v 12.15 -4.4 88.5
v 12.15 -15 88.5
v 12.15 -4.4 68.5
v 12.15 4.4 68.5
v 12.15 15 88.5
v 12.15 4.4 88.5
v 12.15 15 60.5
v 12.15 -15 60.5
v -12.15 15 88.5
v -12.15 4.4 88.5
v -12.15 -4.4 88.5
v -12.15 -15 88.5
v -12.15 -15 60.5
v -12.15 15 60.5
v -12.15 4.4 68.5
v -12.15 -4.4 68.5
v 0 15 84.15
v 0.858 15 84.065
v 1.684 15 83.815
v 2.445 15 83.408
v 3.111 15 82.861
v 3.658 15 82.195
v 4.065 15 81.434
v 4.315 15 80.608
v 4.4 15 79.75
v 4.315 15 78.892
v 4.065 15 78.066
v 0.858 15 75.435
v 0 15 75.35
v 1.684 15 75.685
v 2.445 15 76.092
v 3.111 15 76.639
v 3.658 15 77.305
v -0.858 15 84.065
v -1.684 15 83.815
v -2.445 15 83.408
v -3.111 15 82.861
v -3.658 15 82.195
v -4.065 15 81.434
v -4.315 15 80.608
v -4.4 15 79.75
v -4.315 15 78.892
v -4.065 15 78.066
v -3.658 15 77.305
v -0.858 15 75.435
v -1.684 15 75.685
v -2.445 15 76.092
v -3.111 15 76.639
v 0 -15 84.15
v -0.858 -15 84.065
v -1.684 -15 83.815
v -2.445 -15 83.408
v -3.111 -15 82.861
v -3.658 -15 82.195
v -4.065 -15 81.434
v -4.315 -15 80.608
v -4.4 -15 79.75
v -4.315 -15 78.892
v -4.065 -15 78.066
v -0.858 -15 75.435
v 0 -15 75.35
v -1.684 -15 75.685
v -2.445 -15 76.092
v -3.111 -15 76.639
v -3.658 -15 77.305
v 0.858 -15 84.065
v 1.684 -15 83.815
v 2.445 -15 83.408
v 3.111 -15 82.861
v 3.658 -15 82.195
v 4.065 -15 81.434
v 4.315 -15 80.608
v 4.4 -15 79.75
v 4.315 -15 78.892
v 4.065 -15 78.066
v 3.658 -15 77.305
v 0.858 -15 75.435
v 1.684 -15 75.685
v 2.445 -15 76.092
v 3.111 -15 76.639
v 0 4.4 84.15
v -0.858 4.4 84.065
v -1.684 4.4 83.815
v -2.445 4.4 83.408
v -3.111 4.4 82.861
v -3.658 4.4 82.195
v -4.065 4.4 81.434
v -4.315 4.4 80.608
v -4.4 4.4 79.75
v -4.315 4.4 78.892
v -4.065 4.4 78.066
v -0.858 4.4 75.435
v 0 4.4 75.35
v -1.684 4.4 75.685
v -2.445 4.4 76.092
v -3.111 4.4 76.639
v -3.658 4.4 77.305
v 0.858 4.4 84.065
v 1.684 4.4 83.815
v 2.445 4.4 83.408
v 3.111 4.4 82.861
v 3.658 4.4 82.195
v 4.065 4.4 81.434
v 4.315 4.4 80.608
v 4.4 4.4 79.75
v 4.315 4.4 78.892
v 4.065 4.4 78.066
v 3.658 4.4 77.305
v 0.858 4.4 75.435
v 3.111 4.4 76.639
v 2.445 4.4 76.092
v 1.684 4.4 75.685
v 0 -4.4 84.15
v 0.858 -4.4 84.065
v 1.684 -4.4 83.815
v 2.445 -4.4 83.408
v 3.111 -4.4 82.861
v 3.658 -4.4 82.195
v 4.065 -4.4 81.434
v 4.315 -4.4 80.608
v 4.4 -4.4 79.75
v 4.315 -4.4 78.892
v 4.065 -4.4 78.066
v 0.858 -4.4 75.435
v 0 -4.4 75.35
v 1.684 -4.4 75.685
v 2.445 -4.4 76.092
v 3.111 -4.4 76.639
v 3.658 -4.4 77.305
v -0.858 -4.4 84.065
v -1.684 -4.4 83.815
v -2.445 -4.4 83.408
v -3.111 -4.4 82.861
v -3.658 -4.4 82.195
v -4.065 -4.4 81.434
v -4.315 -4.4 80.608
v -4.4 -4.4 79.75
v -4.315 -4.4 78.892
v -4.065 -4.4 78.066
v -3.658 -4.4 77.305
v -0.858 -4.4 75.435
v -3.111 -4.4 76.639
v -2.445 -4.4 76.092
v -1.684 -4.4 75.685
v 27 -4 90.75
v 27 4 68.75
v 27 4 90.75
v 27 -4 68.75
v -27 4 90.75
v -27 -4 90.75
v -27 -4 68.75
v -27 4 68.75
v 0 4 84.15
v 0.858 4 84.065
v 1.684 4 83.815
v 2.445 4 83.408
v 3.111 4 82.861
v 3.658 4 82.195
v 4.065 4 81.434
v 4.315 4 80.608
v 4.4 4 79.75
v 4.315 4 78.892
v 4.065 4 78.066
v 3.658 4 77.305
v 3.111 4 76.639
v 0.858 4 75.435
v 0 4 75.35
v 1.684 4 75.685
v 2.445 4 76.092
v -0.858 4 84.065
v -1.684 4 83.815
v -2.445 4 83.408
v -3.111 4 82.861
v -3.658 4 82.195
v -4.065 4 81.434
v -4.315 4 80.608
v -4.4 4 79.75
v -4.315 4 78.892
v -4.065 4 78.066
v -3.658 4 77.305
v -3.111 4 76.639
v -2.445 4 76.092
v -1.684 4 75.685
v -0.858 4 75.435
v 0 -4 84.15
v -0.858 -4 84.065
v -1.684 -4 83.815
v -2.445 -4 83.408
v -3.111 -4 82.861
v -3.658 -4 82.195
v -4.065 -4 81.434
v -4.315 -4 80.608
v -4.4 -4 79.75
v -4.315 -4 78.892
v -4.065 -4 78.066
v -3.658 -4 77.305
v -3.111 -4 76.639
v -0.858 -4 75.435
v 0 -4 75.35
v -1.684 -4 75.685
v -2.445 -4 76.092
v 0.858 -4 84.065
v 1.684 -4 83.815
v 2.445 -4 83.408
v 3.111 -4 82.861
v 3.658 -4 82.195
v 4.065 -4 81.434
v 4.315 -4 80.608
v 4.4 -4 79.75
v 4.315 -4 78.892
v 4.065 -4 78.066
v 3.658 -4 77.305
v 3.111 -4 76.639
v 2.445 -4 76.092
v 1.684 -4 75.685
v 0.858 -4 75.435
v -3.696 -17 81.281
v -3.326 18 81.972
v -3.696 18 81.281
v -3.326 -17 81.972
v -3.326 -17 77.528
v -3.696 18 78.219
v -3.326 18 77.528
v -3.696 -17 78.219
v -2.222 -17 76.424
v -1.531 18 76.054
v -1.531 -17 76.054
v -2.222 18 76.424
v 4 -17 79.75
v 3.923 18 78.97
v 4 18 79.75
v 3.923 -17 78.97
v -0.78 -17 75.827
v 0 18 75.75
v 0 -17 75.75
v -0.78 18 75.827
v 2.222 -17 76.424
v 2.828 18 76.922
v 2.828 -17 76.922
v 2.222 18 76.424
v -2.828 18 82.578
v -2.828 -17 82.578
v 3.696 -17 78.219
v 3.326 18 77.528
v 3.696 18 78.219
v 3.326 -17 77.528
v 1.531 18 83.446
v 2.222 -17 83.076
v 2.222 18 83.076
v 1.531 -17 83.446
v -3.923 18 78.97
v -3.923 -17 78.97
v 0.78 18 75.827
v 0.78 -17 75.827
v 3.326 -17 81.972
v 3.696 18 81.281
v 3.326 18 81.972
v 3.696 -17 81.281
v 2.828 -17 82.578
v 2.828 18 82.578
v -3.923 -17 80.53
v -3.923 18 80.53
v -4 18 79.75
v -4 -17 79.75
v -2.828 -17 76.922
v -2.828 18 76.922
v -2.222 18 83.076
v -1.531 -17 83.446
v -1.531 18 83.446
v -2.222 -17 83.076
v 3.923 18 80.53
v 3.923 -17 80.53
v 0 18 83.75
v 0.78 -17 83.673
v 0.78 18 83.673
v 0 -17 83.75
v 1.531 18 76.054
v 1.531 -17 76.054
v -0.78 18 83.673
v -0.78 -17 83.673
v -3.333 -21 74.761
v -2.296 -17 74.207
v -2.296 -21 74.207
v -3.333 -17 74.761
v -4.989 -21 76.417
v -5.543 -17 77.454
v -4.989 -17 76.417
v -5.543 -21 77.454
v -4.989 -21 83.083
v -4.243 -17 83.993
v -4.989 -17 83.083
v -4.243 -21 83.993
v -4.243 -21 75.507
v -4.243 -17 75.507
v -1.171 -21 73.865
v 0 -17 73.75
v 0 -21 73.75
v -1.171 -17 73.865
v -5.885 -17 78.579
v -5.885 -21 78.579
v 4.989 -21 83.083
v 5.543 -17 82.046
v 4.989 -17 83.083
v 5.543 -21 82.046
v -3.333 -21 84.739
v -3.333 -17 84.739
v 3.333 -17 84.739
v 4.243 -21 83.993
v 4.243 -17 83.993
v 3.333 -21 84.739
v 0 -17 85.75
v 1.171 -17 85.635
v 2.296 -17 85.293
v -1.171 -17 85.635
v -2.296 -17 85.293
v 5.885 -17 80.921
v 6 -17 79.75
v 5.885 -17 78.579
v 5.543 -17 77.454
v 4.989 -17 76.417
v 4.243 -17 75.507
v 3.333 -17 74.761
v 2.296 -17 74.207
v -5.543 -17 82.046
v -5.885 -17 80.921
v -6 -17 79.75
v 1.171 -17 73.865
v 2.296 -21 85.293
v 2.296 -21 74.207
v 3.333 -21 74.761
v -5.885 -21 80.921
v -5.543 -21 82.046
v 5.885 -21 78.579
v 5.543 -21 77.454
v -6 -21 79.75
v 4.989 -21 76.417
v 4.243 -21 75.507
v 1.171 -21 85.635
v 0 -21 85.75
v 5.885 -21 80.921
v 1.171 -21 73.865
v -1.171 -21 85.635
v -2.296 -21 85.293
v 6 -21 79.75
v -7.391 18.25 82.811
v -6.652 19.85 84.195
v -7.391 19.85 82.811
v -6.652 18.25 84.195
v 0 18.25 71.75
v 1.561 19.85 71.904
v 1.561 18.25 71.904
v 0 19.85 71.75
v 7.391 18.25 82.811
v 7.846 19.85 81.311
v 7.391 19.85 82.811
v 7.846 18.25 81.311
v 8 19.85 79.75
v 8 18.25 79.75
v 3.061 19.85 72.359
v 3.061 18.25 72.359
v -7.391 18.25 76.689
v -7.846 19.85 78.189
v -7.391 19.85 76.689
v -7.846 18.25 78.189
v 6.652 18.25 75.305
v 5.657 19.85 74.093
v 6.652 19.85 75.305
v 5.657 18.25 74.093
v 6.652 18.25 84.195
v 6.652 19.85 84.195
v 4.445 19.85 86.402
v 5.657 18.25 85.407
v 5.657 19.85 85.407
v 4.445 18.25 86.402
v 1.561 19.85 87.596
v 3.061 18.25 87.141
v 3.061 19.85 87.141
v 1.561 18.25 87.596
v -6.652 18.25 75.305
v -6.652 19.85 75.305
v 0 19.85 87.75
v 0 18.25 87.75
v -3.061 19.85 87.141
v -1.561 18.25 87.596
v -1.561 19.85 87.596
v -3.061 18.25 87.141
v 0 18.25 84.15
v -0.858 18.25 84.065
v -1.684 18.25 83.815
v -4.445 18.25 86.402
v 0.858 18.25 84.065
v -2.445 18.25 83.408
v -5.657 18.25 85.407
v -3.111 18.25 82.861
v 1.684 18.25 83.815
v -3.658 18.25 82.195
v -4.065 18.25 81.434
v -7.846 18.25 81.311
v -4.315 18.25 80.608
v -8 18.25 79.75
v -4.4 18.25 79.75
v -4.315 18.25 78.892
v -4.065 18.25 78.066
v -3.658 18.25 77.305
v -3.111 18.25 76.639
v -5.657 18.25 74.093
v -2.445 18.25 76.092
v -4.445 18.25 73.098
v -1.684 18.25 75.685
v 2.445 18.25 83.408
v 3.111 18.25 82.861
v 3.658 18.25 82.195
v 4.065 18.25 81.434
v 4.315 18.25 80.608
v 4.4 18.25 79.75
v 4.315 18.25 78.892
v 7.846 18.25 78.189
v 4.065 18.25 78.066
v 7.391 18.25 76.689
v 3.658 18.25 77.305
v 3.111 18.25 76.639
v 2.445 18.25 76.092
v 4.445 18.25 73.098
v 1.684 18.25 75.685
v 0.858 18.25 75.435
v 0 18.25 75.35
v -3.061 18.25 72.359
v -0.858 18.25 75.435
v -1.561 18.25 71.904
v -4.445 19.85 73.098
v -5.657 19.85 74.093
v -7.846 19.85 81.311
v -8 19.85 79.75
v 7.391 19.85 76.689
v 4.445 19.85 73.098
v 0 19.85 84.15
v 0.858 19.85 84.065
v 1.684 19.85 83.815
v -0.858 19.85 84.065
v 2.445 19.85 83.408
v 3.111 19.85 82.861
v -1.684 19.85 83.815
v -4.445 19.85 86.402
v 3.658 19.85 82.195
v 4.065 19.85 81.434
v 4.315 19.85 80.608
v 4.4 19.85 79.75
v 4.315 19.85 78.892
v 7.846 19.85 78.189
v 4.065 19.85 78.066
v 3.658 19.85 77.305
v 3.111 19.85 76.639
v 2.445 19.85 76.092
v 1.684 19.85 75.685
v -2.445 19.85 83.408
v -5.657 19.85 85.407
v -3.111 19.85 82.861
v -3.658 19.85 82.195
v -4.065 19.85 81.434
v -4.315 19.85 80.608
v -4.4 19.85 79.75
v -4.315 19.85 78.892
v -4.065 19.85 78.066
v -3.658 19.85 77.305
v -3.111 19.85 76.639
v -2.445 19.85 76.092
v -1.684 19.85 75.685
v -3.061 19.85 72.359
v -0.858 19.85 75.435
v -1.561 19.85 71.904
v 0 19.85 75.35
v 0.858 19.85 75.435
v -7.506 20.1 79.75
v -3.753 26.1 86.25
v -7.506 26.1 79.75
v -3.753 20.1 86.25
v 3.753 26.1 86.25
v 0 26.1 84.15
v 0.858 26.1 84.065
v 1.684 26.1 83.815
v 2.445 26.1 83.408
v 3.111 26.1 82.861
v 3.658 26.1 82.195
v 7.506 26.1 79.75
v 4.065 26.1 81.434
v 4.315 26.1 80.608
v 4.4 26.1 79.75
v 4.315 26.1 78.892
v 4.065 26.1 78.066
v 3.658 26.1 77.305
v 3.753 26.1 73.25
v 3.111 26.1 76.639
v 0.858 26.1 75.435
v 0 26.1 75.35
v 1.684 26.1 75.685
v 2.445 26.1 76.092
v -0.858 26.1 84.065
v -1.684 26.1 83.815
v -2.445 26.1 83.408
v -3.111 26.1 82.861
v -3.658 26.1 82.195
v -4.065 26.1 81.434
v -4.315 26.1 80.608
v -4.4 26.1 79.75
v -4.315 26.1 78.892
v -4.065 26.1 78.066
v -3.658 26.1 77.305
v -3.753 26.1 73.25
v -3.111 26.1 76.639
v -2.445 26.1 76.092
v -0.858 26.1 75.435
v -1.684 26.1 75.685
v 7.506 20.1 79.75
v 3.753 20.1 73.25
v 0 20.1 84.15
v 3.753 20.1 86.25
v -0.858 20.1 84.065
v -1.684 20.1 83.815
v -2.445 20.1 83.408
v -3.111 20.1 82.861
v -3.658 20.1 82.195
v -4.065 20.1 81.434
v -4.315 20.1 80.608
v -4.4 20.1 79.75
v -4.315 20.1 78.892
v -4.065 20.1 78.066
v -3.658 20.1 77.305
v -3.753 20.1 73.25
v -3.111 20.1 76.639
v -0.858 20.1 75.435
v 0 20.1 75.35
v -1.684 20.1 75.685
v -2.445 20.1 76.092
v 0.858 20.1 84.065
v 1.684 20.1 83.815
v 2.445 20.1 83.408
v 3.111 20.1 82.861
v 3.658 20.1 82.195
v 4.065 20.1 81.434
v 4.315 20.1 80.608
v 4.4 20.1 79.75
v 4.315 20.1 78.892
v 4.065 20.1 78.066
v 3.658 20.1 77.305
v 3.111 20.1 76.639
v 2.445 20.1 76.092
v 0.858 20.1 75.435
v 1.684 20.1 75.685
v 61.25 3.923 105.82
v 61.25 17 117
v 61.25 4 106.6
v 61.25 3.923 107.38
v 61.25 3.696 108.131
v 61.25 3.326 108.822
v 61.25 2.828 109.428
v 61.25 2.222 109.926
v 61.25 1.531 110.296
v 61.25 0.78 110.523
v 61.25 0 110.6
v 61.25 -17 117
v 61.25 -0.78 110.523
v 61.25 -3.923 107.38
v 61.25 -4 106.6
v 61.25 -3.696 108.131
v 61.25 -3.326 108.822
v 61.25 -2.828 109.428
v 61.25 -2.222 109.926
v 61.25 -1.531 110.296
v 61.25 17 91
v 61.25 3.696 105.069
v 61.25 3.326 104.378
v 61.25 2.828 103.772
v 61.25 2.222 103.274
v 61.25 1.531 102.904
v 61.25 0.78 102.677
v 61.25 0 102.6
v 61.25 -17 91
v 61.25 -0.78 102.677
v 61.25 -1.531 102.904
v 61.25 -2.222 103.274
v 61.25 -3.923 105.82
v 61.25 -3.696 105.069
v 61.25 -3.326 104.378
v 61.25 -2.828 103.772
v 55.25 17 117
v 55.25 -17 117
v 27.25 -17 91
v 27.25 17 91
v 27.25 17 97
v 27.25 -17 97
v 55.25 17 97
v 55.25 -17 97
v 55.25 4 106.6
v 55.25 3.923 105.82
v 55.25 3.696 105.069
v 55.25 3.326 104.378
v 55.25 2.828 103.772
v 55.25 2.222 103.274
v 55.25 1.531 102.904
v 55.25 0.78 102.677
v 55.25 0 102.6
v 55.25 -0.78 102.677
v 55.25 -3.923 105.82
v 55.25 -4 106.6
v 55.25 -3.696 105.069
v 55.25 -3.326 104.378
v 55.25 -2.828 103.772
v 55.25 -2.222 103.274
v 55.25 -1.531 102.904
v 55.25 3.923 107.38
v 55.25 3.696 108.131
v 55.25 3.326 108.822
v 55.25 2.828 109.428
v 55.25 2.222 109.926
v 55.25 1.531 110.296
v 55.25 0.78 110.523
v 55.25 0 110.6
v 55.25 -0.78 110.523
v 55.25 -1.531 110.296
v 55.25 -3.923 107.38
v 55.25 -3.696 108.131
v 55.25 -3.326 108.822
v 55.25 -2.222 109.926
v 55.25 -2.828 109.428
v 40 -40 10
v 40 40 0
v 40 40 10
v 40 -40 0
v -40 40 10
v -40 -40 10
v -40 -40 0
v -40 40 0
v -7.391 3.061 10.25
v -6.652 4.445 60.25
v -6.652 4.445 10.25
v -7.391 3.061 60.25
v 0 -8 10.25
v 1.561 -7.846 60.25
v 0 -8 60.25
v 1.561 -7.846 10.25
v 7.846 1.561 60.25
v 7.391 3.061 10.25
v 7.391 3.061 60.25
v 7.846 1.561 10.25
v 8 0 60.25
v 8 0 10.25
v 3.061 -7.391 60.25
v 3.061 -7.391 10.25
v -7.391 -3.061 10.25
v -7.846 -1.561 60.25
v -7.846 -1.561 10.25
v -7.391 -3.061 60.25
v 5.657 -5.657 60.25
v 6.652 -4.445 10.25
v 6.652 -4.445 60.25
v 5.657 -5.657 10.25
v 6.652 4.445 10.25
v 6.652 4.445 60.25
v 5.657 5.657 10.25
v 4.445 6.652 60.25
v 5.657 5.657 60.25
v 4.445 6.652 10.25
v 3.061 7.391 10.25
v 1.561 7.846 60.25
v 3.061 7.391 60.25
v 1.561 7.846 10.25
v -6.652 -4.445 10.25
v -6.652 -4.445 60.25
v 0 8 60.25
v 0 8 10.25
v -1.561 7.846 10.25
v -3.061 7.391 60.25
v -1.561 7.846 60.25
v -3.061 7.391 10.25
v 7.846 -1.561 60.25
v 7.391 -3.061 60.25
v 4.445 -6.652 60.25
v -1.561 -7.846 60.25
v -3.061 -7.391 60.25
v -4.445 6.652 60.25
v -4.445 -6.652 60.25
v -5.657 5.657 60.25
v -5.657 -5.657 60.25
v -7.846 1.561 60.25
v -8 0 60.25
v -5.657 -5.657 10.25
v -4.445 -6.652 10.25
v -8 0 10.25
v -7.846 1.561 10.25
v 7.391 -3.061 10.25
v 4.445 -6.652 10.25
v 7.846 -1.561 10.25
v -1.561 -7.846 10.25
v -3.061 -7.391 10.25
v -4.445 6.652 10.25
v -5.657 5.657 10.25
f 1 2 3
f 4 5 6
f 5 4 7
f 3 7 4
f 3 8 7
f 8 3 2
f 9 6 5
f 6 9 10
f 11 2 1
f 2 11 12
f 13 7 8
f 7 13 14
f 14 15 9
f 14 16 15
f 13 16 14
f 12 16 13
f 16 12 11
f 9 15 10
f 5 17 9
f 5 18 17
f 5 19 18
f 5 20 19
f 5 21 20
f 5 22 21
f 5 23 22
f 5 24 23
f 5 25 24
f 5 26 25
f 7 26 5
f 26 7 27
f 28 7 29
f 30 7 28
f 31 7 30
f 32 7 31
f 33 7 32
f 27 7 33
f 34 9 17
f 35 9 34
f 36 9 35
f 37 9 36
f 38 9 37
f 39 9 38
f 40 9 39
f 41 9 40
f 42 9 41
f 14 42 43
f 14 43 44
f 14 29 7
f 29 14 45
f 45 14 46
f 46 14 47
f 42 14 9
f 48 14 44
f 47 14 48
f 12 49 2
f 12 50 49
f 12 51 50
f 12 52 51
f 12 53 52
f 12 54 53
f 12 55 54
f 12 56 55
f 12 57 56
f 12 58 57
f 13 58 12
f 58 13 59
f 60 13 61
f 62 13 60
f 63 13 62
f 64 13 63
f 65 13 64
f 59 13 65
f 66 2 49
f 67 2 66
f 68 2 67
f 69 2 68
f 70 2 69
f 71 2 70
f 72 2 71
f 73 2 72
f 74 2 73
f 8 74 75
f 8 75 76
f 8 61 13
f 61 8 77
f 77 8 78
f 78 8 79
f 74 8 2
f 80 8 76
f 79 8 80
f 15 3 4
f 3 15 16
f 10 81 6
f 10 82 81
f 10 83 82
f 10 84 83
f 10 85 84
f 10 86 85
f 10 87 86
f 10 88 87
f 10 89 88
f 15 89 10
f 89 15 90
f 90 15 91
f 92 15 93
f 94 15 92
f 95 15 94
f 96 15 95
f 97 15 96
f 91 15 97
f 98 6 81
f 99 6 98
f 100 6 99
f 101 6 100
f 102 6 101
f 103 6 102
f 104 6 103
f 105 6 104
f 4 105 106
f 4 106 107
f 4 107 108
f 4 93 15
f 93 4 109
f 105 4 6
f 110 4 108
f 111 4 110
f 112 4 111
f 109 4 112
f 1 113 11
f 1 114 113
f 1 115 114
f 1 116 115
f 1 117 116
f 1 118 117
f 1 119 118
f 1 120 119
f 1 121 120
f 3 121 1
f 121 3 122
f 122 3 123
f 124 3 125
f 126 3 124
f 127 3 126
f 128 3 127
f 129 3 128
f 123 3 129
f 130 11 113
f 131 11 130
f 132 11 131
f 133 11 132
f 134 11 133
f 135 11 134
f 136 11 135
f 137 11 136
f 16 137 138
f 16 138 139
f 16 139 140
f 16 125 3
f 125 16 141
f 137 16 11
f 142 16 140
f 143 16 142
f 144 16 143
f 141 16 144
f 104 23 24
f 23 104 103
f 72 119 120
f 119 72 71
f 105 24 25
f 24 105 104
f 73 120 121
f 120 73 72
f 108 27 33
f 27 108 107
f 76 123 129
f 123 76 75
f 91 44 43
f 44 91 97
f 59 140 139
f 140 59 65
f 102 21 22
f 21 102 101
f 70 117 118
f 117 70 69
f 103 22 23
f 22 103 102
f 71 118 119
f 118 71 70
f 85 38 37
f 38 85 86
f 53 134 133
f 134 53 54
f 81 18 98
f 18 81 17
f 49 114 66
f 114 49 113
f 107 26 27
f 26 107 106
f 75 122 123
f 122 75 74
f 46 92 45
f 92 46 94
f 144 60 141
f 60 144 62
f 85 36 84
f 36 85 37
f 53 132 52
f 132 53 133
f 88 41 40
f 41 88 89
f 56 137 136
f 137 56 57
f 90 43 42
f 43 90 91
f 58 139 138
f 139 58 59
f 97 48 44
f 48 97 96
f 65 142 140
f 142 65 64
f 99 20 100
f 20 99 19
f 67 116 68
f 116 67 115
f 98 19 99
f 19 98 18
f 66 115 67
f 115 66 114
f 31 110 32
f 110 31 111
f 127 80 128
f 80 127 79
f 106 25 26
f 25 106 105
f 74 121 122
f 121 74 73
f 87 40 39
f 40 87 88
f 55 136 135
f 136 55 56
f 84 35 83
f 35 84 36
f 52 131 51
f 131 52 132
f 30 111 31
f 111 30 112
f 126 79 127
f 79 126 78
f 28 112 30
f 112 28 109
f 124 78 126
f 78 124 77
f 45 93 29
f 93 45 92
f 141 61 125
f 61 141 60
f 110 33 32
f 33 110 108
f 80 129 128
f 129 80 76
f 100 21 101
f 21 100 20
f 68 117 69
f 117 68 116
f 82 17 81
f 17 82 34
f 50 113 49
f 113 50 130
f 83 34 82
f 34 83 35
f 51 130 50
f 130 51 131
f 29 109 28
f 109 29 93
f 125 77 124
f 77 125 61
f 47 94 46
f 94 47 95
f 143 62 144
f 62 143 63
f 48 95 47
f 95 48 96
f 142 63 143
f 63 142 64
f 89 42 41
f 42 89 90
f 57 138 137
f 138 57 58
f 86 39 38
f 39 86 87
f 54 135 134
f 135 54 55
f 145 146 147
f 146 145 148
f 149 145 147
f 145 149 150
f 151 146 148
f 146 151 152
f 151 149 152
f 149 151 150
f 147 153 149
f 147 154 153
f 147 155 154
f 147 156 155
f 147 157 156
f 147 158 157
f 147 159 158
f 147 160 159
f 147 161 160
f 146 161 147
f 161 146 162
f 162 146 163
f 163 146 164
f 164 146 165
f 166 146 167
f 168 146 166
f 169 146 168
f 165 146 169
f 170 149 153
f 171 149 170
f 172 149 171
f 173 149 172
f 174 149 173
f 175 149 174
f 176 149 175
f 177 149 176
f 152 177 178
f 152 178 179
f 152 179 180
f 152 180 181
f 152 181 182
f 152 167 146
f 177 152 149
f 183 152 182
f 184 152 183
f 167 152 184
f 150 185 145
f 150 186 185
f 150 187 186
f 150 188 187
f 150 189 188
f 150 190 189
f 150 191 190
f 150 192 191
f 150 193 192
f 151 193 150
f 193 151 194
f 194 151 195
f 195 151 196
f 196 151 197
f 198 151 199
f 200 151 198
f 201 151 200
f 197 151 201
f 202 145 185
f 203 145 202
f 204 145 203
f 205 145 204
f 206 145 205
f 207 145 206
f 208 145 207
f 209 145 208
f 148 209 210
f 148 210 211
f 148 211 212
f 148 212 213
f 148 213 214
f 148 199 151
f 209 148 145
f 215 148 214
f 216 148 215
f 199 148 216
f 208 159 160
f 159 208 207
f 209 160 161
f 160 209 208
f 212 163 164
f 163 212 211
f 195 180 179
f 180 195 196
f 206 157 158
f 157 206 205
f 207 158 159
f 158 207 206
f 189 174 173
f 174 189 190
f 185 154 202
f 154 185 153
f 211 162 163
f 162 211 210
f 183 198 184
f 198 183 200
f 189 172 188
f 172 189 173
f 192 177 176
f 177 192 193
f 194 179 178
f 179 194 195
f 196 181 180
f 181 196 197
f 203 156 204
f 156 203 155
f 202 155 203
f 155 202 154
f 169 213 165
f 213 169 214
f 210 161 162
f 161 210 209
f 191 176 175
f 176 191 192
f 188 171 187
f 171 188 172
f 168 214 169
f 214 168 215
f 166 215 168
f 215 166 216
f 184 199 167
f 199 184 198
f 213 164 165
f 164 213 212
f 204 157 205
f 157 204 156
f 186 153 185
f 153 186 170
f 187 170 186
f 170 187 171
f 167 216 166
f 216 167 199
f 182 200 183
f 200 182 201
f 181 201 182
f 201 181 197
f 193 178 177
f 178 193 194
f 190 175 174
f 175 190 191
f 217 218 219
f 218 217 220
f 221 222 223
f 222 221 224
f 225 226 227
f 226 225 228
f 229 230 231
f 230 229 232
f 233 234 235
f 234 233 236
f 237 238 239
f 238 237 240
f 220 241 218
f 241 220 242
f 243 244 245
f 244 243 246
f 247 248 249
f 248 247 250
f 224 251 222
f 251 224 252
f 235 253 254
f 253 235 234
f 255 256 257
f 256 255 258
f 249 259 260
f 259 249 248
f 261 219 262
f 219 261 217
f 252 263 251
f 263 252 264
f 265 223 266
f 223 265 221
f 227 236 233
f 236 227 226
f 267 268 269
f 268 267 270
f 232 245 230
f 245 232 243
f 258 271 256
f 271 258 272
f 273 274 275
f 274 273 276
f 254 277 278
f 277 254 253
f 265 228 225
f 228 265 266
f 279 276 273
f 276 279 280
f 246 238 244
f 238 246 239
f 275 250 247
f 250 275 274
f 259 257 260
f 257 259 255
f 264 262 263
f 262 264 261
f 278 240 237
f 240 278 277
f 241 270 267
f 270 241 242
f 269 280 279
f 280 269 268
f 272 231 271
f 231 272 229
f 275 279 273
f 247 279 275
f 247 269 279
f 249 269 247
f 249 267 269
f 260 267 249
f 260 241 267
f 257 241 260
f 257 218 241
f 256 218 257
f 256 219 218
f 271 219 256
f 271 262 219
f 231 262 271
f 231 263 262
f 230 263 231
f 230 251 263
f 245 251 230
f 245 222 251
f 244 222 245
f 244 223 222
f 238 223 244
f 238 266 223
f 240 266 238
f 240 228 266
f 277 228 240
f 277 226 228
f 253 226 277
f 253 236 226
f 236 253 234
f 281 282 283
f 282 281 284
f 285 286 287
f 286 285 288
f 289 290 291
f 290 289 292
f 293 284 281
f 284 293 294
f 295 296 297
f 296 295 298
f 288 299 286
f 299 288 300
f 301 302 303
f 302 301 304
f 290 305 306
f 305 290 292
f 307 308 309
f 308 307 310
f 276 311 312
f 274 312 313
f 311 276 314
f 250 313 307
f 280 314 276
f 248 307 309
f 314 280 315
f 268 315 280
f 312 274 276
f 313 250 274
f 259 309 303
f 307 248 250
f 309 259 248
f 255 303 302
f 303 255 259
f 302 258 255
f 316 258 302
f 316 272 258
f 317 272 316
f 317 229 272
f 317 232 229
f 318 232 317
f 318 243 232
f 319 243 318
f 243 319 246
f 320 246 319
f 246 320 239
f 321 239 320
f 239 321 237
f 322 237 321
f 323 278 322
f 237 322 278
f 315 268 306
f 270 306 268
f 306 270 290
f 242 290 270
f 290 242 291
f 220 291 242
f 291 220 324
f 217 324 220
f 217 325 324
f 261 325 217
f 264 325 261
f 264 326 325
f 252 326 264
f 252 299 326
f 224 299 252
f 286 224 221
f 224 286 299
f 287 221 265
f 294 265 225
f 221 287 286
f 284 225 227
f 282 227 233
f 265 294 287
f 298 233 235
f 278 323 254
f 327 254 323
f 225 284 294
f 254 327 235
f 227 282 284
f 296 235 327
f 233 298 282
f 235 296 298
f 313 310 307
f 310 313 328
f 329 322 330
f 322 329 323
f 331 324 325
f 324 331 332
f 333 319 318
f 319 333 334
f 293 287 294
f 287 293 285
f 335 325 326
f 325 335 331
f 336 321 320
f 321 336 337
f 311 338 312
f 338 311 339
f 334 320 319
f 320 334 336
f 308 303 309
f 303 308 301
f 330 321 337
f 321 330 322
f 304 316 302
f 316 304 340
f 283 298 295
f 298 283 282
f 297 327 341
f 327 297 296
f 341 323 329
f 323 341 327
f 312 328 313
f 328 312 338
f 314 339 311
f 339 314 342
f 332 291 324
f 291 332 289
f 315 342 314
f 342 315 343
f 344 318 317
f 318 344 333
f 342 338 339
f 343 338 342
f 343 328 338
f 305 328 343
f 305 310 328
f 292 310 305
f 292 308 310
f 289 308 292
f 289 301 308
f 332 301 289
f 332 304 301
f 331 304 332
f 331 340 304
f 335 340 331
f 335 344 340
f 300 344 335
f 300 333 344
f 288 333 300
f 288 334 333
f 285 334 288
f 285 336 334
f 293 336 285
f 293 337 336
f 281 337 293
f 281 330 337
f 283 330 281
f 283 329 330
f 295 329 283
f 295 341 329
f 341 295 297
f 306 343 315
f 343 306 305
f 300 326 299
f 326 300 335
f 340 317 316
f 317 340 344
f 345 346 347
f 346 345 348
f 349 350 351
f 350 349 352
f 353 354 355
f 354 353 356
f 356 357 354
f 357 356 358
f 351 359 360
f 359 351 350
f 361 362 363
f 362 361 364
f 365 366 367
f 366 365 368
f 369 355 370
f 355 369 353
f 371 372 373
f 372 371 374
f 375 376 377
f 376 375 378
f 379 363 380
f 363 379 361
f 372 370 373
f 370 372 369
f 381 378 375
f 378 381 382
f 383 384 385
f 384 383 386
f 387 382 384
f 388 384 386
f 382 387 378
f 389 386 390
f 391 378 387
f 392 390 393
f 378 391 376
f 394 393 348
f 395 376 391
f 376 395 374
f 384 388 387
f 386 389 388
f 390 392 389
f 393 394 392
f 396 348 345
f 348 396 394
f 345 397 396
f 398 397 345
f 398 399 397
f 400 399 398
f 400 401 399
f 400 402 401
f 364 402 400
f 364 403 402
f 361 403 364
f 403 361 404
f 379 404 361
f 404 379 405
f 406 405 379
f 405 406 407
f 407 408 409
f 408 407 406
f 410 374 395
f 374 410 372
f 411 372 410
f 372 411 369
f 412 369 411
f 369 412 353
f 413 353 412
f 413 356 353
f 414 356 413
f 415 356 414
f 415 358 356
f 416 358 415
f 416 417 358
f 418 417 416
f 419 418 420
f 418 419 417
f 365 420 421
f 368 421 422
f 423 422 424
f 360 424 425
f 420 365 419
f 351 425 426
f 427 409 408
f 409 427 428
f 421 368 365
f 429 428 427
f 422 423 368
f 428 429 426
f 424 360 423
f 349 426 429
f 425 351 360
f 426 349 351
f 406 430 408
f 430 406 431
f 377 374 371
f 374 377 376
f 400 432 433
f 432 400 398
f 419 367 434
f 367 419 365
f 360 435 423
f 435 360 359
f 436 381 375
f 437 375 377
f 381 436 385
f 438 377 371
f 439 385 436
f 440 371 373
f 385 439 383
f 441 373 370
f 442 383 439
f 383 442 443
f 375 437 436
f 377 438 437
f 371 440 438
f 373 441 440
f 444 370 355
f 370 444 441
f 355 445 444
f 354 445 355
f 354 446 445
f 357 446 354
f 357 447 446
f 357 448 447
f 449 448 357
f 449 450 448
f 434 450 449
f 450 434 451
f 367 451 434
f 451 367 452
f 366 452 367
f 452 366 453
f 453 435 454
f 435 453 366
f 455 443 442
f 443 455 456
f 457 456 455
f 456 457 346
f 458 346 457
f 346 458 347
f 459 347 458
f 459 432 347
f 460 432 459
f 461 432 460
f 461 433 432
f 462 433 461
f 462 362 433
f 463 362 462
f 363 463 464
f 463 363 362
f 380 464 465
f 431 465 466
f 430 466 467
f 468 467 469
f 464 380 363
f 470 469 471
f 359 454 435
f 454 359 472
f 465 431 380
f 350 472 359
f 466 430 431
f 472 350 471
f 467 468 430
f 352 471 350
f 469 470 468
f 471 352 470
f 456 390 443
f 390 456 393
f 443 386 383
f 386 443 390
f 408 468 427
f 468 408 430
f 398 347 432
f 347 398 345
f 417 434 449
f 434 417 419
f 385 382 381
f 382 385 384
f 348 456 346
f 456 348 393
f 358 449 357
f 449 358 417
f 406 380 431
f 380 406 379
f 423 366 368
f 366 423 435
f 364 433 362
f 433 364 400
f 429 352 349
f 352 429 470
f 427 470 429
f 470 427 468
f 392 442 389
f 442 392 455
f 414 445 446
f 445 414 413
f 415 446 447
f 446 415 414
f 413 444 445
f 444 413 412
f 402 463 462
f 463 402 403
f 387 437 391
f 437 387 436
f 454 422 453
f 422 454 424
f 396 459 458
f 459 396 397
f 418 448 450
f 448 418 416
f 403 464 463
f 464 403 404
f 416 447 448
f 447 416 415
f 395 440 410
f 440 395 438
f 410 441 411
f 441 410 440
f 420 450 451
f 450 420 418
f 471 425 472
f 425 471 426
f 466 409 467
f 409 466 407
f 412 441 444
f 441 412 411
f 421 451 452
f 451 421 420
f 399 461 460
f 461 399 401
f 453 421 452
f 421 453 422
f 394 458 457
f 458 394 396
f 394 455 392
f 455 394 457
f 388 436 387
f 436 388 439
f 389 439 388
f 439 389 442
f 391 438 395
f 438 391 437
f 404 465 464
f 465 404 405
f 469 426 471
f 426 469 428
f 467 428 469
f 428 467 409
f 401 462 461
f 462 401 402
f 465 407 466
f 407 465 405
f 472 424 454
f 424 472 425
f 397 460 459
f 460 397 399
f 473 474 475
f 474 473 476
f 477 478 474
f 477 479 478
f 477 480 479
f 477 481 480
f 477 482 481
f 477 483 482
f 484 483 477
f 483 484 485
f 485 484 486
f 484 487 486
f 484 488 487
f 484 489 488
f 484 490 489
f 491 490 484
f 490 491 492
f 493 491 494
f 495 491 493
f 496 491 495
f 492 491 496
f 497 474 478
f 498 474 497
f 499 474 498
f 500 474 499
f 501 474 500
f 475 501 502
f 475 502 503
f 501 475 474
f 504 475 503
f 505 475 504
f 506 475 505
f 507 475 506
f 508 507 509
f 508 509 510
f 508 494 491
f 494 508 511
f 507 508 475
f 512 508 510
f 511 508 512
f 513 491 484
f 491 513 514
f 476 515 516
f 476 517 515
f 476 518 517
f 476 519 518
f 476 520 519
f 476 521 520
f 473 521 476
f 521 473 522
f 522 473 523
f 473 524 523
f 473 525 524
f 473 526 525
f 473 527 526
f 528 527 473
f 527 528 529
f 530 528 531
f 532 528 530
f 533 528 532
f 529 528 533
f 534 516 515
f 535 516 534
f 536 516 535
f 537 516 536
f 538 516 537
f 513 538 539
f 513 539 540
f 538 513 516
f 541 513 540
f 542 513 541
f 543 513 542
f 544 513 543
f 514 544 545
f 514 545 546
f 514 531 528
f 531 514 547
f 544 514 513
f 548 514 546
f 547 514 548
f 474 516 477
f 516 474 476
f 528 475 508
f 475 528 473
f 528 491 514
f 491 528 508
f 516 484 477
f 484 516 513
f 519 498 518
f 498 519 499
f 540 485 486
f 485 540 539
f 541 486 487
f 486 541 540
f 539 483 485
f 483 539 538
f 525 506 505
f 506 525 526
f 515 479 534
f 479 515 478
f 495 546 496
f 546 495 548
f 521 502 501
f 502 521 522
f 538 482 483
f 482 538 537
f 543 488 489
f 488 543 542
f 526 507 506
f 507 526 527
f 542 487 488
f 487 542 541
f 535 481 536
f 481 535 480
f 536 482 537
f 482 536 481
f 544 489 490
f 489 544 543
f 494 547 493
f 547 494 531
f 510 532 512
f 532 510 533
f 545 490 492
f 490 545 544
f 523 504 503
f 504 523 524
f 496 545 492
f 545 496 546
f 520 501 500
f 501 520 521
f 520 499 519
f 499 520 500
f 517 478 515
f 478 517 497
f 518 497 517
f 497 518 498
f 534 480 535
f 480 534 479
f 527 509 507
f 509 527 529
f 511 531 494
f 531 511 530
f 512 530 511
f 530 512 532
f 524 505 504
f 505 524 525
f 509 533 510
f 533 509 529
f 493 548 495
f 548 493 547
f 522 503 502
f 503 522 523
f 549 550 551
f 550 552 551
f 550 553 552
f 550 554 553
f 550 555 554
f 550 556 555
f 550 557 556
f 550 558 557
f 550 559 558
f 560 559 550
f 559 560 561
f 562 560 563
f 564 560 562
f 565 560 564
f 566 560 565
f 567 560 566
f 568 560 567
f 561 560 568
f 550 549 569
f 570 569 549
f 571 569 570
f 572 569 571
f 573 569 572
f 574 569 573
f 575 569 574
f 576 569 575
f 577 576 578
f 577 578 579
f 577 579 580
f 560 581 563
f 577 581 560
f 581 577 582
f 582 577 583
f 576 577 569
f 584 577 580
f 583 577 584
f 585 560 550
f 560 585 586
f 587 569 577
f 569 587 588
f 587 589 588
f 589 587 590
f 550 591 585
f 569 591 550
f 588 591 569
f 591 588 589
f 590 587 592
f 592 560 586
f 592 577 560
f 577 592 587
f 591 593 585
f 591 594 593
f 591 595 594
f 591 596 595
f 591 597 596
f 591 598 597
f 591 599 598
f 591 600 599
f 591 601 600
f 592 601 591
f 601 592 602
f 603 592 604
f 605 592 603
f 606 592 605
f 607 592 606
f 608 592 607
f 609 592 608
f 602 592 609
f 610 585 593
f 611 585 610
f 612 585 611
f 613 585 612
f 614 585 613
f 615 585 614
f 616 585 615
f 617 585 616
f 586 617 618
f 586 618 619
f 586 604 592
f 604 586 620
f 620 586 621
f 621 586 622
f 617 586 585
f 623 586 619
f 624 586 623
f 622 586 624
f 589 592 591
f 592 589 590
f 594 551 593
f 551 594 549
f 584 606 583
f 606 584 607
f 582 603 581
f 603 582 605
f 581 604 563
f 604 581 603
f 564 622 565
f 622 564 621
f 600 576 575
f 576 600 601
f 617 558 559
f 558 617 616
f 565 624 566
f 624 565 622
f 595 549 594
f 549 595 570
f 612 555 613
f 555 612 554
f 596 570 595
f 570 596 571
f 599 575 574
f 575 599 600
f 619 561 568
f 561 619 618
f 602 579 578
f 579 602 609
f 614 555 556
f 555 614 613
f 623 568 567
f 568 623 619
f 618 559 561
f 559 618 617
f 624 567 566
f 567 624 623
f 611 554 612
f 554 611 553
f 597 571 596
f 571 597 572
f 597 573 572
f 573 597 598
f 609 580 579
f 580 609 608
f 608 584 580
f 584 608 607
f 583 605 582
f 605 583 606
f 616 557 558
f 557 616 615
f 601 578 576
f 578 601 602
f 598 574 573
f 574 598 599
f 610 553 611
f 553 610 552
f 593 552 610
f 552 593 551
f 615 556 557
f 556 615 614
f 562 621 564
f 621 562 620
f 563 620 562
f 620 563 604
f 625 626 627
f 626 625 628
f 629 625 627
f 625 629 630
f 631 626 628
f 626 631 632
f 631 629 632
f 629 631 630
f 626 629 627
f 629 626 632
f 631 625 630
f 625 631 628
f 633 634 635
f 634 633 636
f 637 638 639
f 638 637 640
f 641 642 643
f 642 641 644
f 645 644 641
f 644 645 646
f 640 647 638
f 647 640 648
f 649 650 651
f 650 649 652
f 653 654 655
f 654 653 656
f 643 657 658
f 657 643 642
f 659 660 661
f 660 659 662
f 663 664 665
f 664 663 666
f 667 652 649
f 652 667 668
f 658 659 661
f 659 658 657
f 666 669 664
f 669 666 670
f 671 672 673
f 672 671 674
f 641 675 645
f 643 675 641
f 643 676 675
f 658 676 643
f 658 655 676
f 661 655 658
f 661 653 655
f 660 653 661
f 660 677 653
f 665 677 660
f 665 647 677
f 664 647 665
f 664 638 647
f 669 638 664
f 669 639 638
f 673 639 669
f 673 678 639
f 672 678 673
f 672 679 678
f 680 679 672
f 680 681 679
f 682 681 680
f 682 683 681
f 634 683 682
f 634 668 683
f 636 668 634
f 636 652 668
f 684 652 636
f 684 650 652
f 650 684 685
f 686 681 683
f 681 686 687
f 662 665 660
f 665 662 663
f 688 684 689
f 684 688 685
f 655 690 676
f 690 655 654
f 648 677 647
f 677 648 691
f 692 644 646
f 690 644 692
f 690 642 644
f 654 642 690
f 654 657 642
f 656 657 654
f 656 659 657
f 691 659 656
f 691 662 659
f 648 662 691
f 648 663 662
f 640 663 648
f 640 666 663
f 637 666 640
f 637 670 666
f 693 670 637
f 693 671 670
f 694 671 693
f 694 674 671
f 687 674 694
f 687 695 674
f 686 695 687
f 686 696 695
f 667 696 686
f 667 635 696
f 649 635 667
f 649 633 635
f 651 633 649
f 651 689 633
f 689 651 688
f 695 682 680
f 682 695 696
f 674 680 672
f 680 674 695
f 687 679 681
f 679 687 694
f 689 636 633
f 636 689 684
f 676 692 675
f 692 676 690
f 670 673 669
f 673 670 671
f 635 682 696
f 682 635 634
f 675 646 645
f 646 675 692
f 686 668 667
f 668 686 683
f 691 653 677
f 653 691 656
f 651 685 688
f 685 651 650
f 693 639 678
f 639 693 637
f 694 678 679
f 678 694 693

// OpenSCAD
$fn = 32;

// ------------------------------------------------------------------------
// Lamp arm: column d16 x 50 mm, arm 54 mm
// Every part is its own module, assembly() places every instance.
// ------------------------------------------------------------------------

// --- part 1 ---
module lamp_base() {
  difference() {
    translate([-40, -40, 0]) cube([80, 80, 10]);
  }
}

// --- part 2 ---
module lamp_column() {
  cylinder(h = 50, d = 16);
}

// --- part 3 ---
module head_fork() {
  difference() {
    translate([-12.15, -15, 0]) cube([24.3, 30, 28]);
    translate([-13.15, -4.4, 8]) cube([26.3, 8.8, 21]);
    translate([0, 0, 19.25]) rotate([90, 0, 0]) cylinder(h = 32, d = 8.8, center = true);
  }
}

// --- part 4 ---
module lamp_arm() {
  difference() {
    translate([-27, -4, 0]) cube([54, 8, 22]);
    translate([0, 0, 11]) rotate([90, 0, 0]) cylinder(h = 10, d = 8.8, center = true);
  }
}

// --- part 5 ---
module arm_pin() {
  rotate([0, 90, 0]) cylinder(h = 36, d = 8, center = true);
  translate([-21, 0, 0]) rotate([0, 90, 0]) cylinder(h = 4, d = 12);
}

// --- part 6 ---
module arm_washer() {
  difference() {
      translate([0, 0, 0]) cylinder(h = 1.6, d = 16);
      translate([0, 0, -1]) cylinder(h = 3.6, d = 8.8);
    }
}

// --- part 7 ---
module arm_nut() {
  difference() {
    linear_extrude(height = 6) polygon(points = [[7.506, 0], [3.753, 6.5], [-3.753, 6.5], [-7.506, 0], [-3.753, -6.5], [3.753, -6.5]]);
    translate([0, 0, -1]) cylinder(h = 8, d = 8.8);
  }
}

// --- part 8 ---
module shade_bracket() {
  difference() {
    translate([-17, -17, 0]) cube([34, 34, 26]);
    translate([-18, -18, 6]) cube([29, 36, 21]);
    translate([14, 0, 15.6]) rotate([0, 90, 0]) cylinder(h = 8, d = 8, center = true);
  }
}

// --- assembly ---
module assembly() {
  color([0.80, 0.24, 0.20]) translate([0, 0, 0]) rotate([0, 0, 0]) lamp_base();
  color([0.20, 0.45, 0.75]) translate([0, 0, 10.25]) rotate([0, 0, 0]) lamp_column();
  color([0.25, 0.62, 0.32]) translate([0, 0, 60.5]) rotate([0, 0, 0]) head_fork();
  color([0.92, 0.70, 0.18]) translate([0, 0, 68.75]) rotate([0, 0, 0]) lamp_arm();
  color([0.58, 0.35, 0.70]) translate([0, 0, 79.75]) rotate([0, 0, 90]) arm_pin();
  color([0.16, 0.66, 0.66]) translate([0, 19.85, 79.75]) rotate([90, 0, 0]) arm_washer();
  color([0.85, 0.48, 0.18]) translate([0, 26.1, 79.75]) rotate([90, 0, 0]) arm_nut();
  color([0.55, 0.60, 0.65]) translate([44.25, 0, 91]) rotate([0, 0, 0]) shade_bracket();
}

assembly();
